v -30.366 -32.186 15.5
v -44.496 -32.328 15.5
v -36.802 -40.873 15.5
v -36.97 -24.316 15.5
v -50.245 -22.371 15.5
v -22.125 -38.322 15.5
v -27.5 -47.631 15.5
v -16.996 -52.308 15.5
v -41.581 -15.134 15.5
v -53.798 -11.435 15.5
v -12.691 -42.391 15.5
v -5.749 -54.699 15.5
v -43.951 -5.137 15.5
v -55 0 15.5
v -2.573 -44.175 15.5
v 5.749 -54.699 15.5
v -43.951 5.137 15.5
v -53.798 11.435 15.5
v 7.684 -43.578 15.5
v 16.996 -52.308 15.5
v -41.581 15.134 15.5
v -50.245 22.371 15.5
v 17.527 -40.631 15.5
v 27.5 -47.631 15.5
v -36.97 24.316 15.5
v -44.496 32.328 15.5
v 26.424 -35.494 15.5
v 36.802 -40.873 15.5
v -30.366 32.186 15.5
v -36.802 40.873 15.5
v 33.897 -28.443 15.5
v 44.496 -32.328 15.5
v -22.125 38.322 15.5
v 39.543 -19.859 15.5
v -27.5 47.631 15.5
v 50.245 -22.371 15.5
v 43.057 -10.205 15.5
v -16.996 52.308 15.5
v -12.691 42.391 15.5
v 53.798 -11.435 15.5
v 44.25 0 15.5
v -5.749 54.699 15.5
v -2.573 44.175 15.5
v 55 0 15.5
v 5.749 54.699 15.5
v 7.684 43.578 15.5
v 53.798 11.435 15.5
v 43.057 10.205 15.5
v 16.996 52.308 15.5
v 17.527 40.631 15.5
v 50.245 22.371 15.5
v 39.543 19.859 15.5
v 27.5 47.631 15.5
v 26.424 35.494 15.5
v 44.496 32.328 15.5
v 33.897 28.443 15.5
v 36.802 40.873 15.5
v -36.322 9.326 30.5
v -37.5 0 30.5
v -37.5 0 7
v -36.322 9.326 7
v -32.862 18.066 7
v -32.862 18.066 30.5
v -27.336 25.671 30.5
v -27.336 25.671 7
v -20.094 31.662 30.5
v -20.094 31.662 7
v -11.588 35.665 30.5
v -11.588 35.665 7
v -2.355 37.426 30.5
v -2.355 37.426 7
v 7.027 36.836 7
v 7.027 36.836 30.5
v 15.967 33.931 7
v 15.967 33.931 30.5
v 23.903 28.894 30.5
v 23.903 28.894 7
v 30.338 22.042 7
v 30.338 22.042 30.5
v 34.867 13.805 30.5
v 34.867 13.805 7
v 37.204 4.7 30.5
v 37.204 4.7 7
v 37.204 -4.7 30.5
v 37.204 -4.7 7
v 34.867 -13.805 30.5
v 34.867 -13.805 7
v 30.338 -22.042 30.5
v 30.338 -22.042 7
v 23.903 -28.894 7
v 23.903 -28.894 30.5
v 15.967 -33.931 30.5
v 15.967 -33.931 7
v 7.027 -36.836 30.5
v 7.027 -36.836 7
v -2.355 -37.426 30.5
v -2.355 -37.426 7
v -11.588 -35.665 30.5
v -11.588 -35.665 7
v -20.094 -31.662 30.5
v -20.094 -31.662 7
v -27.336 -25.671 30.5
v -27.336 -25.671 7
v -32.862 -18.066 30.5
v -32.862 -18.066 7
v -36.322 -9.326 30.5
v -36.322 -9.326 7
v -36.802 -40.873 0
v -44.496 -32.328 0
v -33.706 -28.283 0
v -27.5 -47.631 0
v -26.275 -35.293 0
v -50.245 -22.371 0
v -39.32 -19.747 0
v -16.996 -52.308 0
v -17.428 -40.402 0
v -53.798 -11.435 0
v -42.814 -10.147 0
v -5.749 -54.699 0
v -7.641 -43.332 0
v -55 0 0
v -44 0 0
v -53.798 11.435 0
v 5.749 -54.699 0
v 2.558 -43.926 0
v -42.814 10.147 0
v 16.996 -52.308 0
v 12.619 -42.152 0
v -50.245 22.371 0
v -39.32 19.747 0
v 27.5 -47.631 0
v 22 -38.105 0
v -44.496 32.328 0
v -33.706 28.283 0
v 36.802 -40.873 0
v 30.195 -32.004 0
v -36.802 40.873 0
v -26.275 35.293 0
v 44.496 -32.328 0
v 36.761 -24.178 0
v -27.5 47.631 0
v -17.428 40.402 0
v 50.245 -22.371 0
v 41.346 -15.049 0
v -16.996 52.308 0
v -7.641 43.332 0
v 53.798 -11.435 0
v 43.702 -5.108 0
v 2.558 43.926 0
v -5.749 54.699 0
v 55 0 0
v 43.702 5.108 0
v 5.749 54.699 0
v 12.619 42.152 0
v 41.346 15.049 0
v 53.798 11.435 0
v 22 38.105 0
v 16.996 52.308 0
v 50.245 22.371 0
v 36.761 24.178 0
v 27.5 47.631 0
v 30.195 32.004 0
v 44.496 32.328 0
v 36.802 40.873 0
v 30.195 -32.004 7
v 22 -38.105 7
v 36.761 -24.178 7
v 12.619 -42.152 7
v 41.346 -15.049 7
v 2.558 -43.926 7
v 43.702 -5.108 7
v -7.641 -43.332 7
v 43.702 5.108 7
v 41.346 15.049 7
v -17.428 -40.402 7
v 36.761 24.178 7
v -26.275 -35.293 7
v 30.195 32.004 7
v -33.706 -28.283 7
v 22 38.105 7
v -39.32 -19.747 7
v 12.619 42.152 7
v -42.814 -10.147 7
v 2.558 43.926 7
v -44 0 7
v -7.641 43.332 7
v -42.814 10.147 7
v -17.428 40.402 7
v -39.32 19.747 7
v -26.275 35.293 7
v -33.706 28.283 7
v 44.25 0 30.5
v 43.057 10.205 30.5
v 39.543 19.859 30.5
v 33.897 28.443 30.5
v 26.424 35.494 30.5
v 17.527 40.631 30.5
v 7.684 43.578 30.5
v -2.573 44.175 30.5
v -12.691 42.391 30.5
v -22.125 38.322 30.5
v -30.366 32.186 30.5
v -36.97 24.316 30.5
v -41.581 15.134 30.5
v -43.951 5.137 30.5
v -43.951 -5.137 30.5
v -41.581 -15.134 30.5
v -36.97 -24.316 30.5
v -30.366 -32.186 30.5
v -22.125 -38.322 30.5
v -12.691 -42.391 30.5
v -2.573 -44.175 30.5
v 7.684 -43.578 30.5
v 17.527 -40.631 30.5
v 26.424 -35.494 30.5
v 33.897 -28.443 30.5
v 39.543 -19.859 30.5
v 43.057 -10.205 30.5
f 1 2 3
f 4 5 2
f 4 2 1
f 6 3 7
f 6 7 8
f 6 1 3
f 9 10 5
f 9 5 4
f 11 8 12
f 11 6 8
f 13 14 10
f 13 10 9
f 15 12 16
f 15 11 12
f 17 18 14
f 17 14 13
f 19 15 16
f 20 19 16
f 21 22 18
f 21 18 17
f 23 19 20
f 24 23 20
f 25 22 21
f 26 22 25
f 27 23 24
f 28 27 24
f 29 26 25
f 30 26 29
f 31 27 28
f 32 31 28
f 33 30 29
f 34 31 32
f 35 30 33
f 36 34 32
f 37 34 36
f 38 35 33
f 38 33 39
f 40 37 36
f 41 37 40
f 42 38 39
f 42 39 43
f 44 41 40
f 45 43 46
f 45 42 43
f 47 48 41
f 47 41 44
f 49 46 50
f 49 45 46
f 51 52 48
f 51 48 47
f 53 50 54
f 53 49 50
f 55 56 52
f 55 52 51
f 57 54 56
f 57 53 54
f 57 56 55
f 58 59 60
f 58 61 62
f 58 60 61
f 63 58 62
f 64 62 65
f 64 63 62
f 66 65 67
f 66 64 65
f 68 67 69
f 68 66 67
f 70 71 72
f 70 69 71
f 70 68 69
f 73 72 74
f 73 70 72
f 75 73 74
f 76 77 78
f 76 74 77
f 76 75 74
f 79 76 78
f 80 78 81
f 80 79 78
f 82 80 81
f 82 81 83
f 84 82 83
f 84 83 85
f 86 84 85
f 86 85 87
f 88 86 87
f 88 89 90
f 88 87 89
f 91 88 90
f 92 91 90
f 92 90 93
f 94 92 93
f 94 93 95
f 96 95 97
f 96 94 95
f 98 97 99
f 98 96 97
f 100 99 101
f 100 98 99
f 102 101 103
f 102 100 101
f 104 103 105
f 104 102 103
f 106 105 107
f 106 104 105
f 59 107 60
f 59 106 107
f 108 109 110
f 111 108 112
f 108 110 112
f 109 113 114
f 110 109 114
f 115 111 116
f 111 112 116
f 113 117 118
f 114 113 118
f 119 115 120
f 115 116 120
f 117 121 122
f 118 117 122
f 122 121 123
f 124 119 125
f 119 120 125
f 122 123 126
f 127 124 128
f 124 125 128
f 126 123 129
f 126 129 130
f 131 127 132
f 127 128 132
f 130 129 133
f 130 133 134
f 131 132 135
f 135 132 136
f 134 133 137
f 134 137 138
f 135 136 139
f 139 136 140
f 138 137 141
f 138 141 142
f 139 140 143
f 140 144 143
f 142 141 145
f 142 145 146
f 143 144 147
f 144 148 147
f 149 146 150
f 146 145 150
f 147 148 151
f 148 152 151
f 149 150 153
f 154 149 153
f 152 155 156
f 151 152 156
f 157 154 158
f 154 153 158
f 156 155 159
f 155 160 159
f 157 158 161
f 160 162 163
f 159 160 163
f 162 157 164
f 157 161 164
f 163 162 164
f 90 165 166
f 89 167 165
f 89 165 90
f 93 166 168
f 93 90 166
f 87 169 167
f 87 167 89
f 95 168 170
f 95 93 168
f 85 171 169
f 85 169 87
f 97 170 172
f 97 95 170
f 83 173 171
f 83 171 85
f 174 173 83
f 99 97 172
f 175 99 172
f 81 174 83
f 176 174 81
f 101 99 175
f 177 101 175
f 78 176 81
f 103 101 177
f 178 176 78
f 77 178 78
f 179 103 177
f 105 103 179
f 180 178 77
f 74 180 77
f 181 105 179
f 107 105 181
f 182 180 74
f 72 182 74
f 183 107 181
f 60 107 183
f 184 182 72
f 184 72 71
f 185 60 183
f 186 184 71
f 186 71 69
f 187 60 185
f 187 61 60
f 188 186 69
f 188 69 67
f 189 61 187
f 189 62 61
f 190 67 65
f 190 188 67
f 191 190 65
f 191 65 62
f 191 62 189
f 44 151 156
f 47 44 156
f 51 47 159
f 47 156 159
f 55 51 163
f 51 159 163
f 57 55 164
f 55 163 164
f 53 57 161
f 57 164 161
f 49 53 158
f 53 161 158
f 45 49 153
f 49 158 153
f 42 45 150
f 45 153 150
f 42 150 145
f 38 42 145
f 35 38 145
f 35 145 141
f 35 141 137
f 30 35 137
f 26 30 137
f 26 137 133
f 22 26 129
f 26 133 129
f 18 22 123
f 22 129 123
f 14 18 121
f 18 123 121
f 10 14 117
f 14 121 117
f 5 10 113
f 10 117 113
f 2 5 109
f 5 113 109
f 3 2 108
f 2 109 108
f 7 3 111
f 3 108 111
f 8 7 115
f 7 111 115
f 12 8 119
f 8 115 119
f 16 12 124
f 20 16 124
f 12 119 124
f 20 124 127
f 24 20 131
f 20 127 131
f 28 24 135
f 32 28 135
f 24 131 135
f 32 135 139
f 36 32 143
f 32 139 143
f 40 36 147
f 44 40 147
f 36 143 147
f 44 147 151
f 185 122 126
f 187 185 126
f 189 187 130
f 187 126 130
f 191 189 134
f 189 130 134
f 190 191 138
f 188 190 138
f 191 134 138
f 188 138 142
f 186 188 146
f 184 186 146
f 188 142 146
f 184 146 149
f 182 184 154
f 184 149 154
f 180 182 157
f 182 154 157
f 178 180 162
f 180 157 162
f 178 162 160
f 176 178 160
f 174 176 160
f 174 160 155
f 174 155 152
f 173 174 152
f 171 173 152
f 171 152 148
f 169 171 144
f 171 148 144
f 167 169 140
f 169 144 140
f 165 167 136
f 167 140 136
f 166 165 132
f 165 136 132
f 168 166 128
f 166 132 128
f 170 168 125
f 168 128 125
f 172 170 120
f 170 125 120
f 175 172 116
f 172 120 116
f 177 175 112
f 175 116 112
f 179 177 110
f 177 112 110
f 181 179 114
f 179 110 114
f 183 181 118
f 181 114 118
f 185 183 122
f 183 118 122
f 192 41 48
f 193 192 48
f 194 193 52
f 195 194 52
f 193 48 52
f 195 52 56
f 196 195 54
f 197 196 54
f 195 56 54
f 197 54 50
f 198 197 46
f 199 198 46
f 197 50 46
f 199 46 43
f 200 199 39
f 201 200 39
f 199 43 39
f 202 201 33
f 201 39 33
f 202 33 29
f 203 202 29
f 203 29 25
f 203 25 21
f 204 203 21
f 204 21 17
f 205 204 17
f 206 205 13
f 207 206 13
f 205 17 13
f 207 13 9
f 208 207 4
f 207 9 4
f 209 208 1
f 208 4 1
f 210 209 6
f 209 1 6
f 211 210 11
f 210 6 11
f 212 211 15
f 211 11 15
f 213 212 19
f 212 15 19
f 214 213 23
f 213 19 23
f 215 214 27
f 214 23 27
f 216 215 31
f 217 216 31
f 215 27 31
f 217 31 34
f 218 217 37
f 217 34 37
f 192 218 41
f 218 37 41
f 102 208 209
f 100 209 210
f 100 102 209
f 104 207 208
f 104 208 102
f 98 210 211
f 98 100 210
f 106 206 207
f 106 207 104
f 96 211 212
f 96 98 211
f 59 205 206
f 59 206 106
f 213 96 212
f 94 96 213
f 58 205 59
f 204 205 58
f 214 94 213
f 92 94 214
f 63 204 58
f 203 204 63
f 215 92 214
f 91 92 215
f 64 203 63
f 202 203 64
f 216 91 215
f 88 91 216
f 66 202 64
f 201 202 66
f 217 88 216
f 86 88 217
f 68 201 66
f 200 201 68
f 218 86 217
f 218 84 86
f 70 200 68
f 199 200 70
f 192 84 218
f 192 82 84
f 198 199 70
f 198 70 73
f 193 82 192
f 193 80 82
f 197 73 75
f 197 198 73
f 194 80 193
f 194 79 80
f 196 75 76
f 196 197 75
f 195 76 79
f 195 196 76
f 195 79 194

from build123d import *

# Parameters (mm, degrees)
SKETCH1_R               = 55
BOSS_EXTRUDE1_DEPTH     = 15.5
SKETCH2_R               = 44.25
BOSS_EXTRUDE2_DEPTH     = 15
SKETCH3_R               = 44
CUT_EXTRUDE1_DEPTH      = 7
CUT_EXTRUDE2_DEPTH      = 82.254230659
CUT_EXTRUDE2_DEPTH_BACK = 82.254230659
SKETCH4_R               = 37.5


with BuildPart() as part:
    # Sketch1 → Boss-Extrude1 (new body)
    with BuildSketch(Plane.XY):
        Circle(SKETCH1_R)
    extrude(amount=BOSS_EXTRUDE1_DEPTH)

    # Sketch2 → Boss-Extrude2 (add)
    with BuildSketch(Plane.XY.offset(15.5)):
        Circle(SKETCH2_R)
    extrude(amount=BOSS_EXTRUDE2_DEPTH)

    # Sketch3 → Cut-Extrude1 (cut)
    with BuildSketch(Plane(origin=(0, 0, 0), x_dir=(-1, 0, 0), z_dir=(0, 0, -1))):
        Circle(SKETCH3_R)
    extrude(amount=-CUT_EXTRUDE1_DEPTH, mode=Mode.SUBTRACT)

    # Sketch4 → Cut-Extrude2 (cut, two sides: drawn at the far end of the back side and taken through both)
    with BuildSketch(Plane(origin=(0, 0, 7), x_dir=(-1, 0, 0), z_dir=(0, 0, -1)).offset(-CUT_EXTRUDE2_DEPTH_BACK)):
        Circle(SKETCH4_R)
    extrude(amount=CUT_EXTRUDE2_DEPTH + CUT_EXTRUDE2_DEPTH_BACK, mode=Mode.SUBTRACT)


solid = part.part
